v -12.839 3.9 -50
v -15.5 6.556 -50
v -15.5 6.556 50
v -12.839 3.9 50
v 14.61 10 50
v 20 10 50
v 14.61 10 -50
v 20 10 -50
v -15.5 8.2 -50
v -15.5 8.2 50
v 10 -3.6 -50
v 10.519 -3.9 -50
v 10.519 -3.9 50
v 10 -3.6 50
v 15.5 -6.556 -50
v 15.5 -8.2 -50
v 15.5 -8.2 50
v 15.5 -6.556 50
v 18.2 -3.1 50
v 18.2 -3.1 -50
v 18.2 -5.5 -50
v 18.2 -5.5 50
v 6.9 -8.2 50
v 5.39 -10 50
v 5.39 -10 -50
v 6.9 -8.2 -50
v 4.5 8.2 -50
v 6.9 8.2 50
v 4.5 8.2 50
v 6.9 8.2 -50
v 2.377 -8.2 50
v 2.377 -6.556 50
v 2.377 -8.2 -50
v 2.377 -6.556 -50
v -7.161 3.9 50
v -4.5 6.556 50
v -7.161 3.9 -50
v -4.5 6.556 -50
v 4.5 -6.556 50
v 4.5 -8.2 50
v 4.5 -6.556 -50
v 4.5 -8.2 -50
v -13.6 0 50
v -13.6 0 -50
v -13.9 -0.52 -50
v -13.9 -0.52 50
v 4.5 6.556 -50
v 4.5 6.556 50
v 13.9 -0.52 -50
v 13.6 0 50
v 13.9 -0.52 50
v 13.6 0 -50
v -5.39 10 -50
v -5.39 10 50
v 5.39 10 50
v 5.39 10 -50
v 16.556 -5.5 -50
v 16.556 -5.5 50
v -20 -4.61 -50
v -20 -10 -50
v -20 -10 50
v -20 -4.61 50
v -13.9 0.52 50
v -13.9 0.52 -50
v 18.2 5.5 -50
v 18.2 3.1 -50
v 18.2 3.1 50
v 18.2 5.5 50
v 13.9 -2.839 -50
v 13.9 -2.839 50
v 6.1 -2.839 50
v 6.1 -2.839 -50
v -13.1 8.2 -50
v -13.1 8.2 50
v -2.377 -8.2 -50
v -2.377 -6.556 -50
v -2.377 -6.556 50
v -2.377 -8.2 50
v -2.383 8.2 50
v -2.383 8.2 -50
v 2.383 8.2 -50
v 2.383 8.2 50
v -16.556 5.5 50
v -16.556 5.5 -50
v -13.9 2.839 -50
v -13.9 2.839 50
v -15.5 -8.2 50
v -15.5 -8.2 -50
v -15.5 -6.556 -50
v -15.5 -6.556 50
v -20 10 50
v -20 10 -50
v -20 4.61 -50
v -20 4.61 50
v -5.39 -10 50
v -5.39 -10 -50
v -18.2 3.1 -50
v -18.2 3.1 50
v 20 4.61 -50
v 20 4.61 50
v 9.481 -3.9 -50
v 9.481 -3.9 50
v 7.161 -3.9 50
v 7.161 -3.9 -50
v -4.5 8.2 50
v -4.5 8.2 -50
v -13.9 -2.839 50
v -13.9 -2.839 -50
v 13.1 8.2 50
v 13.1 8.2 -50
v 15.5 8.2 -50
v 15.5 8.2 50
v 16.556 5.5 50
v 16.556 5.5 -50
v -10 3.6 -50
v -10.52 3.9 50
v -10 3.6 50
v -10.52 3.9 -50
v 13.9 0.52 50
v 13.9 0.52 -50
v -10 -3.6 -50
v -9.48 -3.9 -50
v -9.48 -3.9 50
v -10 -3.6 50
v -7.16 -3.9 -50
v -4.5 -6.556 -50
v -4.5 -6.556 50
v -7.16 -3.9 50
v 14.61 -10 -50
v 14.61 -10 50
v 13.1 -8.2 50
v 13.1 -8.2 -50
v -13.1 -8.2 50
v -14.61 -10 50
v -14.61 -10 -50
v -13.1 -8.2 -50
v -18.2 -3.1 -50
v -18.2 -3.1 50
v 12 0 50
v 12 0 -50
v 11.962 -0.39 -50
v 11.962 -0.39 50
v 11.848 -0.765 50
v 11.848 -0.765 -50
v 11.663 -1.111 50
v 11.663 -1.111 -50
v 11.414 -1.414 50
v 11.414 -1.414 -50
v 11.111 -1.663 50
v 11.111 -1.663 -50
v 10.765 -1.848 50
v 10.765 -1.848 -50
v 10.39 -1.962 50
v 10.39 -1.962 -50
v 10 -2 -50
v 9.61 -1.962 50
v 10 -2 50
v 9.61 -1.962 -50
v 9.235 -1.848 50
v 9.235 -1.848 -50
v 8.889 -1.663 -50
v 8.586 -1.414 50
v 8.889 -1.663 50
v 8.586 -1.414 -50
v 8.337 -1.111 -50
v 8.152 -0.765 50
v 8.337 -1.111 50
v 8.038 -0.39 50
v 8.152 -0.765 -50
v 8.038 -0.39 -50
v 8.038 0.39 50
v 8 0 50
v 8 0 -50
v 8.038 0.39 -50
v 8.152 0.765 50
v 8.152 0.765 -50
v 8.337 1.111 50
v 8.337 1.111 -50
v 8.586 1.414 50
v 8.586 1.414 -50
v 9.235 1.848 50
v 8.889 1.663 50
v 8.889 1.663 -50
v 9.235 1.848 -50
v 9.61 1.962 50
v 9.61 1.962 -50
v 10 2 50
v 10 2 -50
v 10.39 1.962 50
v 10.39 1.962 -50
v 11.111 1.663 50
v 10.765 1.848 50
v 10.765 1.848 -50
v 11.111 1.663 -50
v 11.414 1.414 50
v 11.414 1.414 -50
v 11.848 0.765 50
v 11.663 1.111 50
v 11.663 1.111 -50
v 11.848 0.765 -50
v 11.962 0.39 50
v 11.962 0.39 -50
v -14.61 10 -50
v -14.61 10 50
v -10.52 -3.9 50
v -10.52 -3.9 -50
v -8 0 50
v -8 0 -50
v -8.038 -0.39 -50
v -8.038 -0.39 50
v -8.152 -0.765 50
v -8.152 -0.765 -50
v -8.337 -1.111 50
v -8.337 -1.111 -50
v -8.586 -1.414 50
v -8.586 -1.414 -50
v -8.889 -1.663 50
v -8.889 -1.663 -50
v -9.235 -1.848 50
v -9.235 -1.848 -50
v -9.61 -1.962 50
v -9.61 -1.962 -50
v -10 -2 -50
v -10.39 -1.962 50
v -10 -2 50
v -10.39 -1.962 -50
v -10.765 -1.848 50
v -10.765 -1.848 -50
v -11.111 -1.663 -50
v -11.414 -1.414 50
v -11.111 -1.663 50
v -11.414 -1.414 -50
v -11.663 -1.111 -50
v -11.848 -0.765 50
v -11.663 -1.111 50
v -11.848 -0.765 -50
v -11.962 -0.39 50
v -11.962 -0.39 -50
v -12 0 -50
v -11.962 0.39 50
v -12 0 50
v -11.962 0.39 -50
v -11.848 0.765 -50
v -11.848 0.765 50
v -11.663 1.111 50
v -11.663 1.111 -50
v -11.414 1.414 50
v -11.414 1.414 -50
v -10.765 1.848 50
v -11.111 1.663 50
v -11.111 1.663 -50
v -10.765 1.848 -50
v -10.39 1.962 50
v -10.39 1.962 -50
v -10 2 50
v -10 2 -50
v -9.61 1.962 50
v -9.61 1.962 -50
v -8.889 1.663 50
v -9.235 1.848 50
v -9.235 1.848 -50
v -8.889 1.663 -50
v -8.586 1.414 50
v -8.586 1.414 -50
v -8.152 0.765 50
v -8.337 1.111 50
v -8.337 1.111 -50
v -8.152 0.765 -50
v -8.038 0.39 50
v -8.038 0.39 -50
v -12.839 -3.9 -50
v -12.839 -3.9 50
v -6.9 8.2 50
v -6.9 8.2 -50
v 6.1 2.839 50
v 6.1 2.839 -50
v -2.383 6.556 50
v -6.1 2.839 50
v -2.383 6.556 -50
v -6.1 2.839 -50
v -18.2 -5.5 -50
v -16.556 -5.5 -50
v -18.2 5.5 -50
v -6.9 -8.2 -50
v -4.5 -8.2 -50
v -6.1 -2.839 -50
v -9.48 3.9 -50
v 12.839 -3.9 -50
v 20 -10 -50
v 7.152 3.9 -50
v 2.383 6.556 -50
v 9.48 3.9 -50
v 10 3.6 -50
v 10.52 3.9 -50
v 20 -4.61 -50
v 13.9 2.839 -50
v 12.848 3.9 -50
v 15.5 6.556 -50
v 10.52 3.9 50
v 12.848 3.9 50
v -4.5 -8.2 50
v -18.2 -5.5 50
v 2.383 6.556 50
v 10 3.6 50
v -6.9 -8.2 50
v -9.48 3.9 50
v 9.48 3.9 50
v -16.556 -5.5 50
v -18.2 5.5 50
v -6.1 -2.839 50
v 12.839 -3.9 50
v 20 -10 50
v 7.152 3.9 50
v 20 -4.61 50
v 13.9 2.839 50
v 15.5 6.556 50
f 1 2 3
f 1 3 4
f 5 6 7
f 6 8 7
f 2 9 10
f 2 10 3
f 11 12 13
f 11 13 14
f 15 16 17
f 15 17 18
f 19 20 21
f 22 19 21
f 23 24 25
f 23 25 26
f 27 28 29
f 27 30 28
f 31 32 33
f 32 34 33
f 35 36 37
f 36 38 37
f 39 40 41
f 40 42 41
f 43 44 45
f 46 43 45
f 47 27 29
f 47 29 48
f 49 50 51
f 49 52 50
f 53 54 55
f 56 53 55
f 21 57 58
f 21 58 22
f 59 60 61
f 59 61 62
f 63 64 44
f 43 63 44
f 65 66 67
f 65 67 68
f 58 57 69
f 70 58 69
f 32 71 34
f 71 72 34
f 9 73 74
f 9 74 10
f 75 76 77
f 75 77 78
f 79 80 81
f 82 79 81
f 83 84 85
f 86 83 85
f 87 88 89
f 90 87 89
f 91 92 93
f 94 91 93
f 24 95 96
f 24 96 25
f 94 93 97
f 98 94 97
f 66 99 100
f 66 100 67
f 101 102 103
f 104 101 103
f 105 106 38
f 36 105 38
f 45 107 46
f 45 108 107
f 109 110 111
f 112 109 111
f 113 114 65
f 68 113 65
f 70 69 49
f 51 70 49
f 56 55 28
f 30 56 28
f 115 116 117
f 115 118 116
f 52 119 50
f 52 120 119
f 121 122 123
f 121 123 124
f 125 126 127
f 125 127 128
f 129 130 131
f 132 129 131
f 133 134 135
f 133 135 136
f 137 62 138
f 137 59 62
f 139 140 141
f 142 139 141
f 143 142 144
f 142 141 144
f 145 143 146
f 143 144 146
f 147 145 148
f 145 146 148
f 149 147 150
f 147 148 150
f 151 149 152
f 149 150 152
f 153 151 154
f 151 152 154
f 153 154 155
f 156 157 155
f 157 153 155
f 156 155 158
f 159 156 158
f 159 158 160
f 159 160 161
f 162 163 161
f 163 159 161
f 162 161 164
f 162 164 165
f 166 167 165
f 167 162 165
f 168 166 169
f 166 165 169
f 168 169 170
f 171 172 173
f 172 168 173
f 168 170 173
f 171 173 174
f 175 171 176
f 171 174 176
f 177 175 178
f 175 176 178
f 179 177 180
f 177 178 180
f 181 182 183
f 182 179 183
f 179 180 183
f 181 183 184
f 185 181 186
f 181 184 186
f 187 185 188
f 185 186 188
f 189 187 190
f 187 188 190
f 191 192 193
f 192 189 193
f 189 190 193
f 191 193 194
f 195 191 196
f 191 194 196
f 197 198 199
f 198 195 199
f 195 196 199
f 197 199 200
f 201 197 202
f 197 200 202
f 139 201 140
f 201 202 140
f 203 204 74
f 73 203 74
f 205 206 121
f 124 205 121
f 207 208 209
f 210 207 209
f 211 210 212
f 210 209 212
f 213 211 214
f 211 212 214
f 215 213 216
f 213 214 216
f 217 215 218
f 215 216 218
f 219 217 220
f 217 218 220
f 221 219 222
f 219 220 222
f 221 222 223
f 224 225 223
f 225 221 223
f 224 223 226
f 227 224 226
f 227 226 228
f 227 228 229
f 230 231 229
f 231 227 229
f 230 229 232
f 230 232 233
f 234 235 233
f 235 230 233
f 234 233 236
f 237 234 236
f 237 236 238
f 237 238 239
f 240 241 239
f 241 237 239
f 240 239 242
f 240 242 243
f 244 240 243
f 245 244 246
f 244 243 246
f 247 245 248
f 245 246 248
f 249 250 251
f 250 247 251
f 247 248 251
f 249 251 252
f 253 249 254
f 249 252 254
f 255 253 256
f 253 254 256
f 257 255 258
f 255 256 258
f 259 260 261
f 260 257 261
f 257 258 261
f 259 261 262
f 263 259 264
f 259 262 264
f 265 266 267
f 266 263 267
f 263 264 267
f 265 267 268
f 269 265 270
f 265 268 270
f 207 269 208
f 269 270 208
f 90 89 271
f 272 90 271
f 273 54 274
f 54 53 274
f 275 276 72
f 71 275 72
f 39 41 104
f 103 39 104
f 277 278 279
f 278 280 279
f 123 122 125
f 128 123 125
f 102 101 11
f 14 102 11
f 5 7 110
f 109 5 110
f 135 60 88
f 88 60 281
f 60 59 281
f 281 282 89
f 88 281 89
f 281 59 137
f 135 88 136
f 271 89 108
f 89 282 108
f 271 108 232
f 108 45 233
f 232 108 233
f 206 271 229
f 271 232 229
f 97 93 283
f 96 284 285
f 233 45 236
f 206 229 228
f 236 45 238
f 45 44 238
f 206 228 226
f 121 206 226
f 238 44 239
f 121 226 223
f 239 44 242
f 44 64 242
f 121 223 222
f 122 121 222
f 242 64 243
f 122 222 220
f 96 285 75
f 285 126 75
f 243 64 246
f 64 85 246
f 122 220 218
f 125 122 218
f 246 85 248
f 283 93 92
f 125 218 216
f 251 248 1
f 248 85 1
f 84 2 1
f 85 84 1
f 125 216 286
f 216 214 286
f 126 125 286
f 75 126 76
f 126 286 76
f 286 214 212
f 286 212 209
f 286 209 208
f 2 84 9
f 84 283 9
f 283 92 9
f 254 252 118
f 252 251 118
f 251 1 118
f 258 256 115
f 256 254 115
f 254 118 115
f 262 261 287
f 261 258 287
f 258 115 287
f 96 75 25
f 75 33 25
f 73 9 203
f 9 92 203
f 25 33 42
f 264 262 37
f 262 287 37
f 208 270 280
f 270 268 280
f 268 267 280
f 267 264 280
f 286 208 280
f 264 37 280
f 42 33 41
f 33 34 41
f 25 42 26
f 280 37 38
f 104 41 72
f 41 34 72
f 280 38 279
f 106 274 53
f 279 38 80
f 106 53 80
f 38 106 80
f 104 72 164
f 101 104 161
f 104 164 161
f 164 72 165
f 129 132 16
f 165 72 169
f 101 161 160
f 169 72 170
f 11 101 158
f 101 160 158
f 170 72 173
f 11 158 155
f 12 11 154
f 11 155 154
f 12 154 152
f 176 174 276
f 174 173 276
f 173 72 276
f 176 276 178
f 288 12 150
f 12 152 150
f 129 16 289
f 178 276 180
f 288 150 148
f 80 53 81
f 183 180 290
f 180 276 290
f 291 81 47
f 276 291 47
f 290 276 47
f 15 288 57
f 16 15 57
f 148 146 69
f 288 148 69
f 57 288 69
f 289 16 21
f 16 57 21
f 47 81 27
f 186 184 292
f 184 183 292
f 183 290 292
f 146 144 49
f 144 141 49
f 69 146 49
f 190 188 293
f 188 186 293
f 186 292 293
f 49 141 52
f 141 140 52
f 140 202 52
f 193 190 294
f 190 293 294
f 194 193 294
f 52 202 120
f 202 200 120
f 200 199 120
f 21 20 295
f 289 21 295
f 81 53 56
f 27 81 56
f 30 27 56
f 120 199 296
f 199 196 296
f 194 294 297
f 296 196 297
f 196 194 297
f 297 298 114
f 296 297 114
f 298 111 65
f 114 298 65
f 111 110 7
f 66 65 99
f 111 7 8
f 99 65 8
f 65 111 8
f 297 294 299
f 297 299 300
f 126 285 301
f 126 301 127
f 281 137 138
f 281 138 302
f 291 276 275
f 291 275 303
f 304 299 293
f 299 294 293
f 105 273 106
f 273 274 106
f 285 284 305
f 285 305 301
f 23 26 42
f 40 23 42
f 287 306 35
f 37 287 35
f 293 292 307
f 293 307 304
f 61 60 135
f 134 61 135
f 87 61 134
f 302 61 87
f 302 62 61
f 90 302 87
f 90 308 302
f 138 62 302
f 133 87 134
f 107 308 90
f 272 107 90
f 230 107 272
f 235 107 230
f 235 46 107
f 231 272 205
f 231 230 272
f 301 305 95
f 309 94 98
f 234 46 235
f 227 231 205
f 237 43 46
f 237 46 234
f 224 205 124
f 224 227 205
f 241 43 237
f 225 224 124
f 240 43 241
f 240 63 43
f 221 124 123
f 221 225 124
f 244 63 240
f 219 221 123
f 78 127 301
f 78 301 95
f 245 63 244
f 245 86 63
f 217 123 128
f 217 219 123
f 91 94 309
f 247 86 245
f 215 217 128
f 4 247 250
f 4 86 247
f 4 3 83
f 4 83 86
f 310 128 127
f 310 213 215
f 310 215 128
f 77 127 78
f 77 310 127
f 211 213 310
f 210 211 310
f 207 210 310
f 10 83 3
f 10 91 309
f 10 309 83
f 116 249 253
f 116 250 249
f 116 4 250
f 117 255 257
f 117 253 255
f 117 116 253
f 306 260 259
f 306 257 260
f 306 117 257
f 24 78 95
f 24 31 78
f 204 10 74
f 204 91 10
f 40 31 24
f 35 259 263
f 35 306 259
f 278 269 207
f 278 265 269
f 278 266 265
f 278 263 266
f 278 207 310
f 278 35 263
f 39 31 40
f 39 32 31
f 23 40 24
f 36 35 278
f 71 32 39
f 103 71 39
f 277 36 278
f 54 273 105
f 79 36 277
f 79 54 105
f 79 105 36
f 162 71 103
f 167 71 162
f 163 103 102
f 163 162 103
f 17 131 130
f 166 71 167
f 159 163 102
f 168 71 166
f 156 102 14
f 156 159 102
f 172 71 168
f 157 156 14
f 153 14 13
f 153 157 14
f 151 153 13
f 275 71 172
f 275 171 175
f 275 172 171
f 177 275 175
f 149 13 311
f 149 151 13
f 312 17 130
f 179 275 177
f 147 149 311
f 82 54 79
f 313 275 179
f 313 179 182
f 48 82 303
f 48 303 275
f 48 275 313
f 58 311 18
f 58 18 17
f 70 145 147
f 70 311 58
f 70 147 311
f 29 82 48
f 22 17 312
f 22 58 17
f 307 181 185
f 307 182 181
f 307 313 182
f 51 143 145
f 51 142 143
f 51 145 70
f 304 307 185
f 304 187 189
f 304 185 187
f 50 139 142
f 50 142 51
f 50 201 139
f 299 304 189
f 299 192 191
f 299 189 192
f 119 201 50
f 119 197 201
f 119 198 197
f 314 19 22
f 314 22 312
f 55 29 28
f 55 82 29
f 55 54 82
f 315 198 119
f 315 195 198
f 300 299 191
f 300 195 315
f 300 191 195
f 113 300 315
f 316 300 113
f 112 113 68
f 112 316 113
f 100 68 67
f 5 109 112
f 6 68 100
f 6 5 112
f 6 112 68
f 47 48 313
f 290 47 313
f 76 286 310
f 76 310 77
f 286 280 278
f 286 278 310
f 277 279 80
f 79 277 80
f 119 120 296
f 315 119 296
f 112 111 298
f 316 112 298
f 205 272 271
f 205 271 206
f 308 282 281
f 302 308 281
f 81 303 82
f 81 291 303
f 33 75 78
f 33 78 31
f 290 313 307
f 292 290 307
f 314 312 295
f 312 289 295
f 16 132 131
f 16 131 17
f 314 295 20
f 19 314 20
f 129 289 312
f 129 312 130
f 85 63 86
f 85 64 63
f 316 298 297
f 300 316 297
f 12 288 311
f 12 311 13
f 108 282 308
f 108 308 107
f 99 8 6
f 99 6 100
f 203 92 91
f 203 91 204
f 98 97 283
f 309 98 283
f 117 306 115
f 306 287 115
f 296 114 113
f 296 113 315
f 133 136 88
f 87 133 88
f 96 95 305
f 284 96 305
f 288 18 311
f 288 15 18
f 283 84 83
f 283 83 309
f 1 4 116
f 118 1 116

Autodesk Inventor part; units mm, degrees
ref_plane "YZ Plane" through (0, 0, 0) normal (1, 0, 0) x (0, 1, 0)
ref_plane "XZ Plane" through (0, 0, 0) normal (0, 1, 0) x (-1, 0, 0)
ref_plane "XY Plane" through (0, 0, 0) normal (0, 0, 1) x (1, 0, 0)
sketch "Sketch1" plane through (0, 0, 0) normal (0, 0, 1) x (1, 0, 0)
  line L0 (4.5, 8.2) -> (4.5, 6.5562)
  line L1 (6.9, 8.2) -> (4.5, 8.2)
  line L2 (5.3896, 10) -> (6.9, 8.2)
  line L3 (-5.3896, 10) -> (5.3896, 10)
  line L4 (-5.3896, 10) -> (-6.9, 8.2)
  line L5 (-6.9, 8.2) -> (-4.5, 8.2)
  line L6 (-4.5, 8.2) -> (-4.5, 6.5562)
  line L7 (-4.5, 6.5562) -> (-7.1607, 3.9)
  line L8 (-9.4804, 3.8998) -> (-7.1607, 3.9)
  line L9 (-9.4804, 3.8998) -> (-10, 3.5998)
  line L10 (-10.5196, 3.8998) -> (-10, 3.5998)
  line L11 (-12.8393, 3.9) -> (-10.5196, 3.8998)
  line L12 (-15.5, 6.5562) -> (-12.8393, 3.9)
  line L13 (-15.5, 8.2) -> (-15.5, 6.5562)
  line L14 (-13.1, 8.2) -> (-15.5, 8.2)
  line L15 (-14.6104, 10) -> (-13.1, 8.2)
  line L16 (-20, 10) -> (-14.6104, 10)
  line L17 (-20, 10) -> (-20, 4.6104)
  line L18 (-20, 4.6104) -> (-18.2, 3.1)
  line L19 (-18.2, 3.1) -> (-18.2, 5.5)
  line L20 (-16.5562, 5.5) -> (-18.2, 5.5)
  line L21 (-16.5562, 5.5) -> (-13.9, 2.8393)
  line L22 (-13.9, 0.5196) -> (-13.9, 2.8393)
  line L23 (-13.9, 0.5196) -> (-13.6, 0)
  line L24 (-13.6, 0) -> (-13.9, -0.5196)
  line L25 (-13.9, -2.8393) -> (-13.9, -0.5196)
  line L26 (-16.5562, -5.5) -> (-13.9, -2.8393)
  line L27 (-16.5562, -5.5) -> (-18.2, -5.5)
  line L28 (-18.2, -3.1) -> (-18.2, -5.5)
  line L29 (-20, -4.6104) -> (-18.2, -3.1)
  line L30 (-20, -10) -> (-20, -4.6104)
  line L31 (-20, -10) -> (-14.6104, -10)
  line L32 (-14.6104, -10) -> (-13.1, -8.2)
  line L33 (-13.1, -8.2) -> (-15.5, -8.2)
  line L34 (-15.5, -8.2) -> (-15.5, -6.5562)
  line L35 (-15.5, -6.5562) -> (-12.8393, -3.9)
  line L36 (-12.8393, -3.9) -> (-10.5196, -3.9002)
  line L37 (-10.5196, -3.9002) -> (-10, -3.6002)
  line L38 (-9.4804, -3.9002) -> (-10, -3.6002)
  line L39 (-9.4804, -3.9002) -> (-7.1604, -3.9002)
  line L40 (-4.5, -6.5562) -> (-7.1604, -3.9002)
  line L41 (-4.5, -8.2) -> (-4.5, -6.5562)
  line L42 (-6.9, -8.2) -> (-4.5, -8.2)
  line L43 (-5.3896, -10) -> (-6.9, -8.2)
  line L44 (-5.3896, -10) -> (5.3896, -10)
  line L45 (5.3896, -10) -> (6.9, -8.2)
  line L46 (6.9, -8.2) -> (4.5, -8.2)
  line L47 (4.5, -8.2) -> (4.5, -6.5562)
  line L48 (4.5, -6.5562) -> (7.1607, -3.9)
  line L49 (9.4808, -3.9) -> (7.1607, -3.9)
  line L50 (9.4808, -3.9) -> (10, -3.6002)
  line L51 (10.5192, -3.9) -> (10, -3.6002)
  line L52 (12.8393, -3.9) -> (10.5192, -3.9)
  line L53 (15.5, -6.5562) -> (12.8393, -3.9)
  line L54 (15.5, -8.2) -> (15.5, -6.5562)
  line L55 (13.1, -8.2) -> (15.5, -8.2)
  line L56 (14.6104, -10) -> (13.1, -8.2)
  line L57 (20, -10) -> (14.6104, -10)
  line L58 (20, -10) -> (20, -4.6104)
  line L59 (20, -4.6104) -> (18.2, -3.1)
  line L60 (18.2, -3.1) -> (18.2, -5.5)
  line L61 (16.5562, -5.5) -> (18.2, -5.5)
  line L62 (16.5562, -5.5) -> (13.9, -2.8393)
  line L63 (13.9, -2.8393) -> (13.9, -0.5196)
  line L64 (13.6, 0) -> (13.9, -0.5196)
  line L65 (13.9, 0.5196) -> (13.6, 0)
  line L66 (13.9, 0.5196) -> (13.9, 2.8393)
  line L67 (16.5562, 5.5) -> (13.9, 2.8393)
  line L68 (16.5562, 5.5) -> (18.2, 5.5)
  line L69 (18.2, 3.1) -> (18.2, 5.5)
  line L70 (20, 4.6104) -> (18.2, 3.1)
  line L71 (20, 10) -> (20, 4.6104)
  line L72 (20, 10) -> (14.6104, 10)
  line L73 (14.6104, 10) -> (13.1, 8.2)
  line L74 (13.1, 8.2) -> (15.5, 8.2)
  line L75 (15.5, 8.2) -> (15.5, 6.5562)
  line L76 (15.5, 6.5562) -> (12.8481, 3.8998)
  line L77 (10.5196, 3.8998) -> (12.8481, 3.8998)
  line L78 (10.5196, 3.8998) -> (10, 3.5998)
  line L79 (9.4804, 3.8998) -> (10, 3.5998)
  line L80 (7.1519, 3.8998) -> (9.4804, 3.8998)
  line L81 (4.5, 6.5562) -> (7.1519, 3.8998)
  circle A0 centre (-10, 0) radius 2
  circle A1 centre (10, 0) radius 2
  line L82 (6.1, 2.8393) -> (2.3832, 6.5562)
  line L83 (6.1, 2.8393) -> (6.1, -2.8393)
  line L84 (6.1, -2.8393) -> (2.3769, -6.5562)
  line L85 (2.3769, -6.5562) -> (2.3769, -8.2)
  line L86 (-2.3769, -8.2) -> (2.3769, -8.2)
  line L87 (-2.3769, -6.5562) -> (-2.3769, -8.2)
  line L88 (-6.1, -2.8393) -> (-2.3769, -6.5562)
  line L89 (-6.1, 2.8393) -> (-6.1, -2.8393)
  line L90 (-6.1, 2.8393) -> (-2.3832, 6.5562)
  line L91 (-2.3832, 6.5562) -> (-2.3832, 8.2)
  line L92 (-2.3832, 8.2) -> (2.3832, 8.2)
  line L93 (2.3832, 6.5562) -> (2.3832, 8.2)
  point P0 (0, 0)
  point P1 (0, 0)
extrude "Extrusion1" add sketch "Sketch1" along normal mid plane 100
properties part number "vslot_2040_100mm"
